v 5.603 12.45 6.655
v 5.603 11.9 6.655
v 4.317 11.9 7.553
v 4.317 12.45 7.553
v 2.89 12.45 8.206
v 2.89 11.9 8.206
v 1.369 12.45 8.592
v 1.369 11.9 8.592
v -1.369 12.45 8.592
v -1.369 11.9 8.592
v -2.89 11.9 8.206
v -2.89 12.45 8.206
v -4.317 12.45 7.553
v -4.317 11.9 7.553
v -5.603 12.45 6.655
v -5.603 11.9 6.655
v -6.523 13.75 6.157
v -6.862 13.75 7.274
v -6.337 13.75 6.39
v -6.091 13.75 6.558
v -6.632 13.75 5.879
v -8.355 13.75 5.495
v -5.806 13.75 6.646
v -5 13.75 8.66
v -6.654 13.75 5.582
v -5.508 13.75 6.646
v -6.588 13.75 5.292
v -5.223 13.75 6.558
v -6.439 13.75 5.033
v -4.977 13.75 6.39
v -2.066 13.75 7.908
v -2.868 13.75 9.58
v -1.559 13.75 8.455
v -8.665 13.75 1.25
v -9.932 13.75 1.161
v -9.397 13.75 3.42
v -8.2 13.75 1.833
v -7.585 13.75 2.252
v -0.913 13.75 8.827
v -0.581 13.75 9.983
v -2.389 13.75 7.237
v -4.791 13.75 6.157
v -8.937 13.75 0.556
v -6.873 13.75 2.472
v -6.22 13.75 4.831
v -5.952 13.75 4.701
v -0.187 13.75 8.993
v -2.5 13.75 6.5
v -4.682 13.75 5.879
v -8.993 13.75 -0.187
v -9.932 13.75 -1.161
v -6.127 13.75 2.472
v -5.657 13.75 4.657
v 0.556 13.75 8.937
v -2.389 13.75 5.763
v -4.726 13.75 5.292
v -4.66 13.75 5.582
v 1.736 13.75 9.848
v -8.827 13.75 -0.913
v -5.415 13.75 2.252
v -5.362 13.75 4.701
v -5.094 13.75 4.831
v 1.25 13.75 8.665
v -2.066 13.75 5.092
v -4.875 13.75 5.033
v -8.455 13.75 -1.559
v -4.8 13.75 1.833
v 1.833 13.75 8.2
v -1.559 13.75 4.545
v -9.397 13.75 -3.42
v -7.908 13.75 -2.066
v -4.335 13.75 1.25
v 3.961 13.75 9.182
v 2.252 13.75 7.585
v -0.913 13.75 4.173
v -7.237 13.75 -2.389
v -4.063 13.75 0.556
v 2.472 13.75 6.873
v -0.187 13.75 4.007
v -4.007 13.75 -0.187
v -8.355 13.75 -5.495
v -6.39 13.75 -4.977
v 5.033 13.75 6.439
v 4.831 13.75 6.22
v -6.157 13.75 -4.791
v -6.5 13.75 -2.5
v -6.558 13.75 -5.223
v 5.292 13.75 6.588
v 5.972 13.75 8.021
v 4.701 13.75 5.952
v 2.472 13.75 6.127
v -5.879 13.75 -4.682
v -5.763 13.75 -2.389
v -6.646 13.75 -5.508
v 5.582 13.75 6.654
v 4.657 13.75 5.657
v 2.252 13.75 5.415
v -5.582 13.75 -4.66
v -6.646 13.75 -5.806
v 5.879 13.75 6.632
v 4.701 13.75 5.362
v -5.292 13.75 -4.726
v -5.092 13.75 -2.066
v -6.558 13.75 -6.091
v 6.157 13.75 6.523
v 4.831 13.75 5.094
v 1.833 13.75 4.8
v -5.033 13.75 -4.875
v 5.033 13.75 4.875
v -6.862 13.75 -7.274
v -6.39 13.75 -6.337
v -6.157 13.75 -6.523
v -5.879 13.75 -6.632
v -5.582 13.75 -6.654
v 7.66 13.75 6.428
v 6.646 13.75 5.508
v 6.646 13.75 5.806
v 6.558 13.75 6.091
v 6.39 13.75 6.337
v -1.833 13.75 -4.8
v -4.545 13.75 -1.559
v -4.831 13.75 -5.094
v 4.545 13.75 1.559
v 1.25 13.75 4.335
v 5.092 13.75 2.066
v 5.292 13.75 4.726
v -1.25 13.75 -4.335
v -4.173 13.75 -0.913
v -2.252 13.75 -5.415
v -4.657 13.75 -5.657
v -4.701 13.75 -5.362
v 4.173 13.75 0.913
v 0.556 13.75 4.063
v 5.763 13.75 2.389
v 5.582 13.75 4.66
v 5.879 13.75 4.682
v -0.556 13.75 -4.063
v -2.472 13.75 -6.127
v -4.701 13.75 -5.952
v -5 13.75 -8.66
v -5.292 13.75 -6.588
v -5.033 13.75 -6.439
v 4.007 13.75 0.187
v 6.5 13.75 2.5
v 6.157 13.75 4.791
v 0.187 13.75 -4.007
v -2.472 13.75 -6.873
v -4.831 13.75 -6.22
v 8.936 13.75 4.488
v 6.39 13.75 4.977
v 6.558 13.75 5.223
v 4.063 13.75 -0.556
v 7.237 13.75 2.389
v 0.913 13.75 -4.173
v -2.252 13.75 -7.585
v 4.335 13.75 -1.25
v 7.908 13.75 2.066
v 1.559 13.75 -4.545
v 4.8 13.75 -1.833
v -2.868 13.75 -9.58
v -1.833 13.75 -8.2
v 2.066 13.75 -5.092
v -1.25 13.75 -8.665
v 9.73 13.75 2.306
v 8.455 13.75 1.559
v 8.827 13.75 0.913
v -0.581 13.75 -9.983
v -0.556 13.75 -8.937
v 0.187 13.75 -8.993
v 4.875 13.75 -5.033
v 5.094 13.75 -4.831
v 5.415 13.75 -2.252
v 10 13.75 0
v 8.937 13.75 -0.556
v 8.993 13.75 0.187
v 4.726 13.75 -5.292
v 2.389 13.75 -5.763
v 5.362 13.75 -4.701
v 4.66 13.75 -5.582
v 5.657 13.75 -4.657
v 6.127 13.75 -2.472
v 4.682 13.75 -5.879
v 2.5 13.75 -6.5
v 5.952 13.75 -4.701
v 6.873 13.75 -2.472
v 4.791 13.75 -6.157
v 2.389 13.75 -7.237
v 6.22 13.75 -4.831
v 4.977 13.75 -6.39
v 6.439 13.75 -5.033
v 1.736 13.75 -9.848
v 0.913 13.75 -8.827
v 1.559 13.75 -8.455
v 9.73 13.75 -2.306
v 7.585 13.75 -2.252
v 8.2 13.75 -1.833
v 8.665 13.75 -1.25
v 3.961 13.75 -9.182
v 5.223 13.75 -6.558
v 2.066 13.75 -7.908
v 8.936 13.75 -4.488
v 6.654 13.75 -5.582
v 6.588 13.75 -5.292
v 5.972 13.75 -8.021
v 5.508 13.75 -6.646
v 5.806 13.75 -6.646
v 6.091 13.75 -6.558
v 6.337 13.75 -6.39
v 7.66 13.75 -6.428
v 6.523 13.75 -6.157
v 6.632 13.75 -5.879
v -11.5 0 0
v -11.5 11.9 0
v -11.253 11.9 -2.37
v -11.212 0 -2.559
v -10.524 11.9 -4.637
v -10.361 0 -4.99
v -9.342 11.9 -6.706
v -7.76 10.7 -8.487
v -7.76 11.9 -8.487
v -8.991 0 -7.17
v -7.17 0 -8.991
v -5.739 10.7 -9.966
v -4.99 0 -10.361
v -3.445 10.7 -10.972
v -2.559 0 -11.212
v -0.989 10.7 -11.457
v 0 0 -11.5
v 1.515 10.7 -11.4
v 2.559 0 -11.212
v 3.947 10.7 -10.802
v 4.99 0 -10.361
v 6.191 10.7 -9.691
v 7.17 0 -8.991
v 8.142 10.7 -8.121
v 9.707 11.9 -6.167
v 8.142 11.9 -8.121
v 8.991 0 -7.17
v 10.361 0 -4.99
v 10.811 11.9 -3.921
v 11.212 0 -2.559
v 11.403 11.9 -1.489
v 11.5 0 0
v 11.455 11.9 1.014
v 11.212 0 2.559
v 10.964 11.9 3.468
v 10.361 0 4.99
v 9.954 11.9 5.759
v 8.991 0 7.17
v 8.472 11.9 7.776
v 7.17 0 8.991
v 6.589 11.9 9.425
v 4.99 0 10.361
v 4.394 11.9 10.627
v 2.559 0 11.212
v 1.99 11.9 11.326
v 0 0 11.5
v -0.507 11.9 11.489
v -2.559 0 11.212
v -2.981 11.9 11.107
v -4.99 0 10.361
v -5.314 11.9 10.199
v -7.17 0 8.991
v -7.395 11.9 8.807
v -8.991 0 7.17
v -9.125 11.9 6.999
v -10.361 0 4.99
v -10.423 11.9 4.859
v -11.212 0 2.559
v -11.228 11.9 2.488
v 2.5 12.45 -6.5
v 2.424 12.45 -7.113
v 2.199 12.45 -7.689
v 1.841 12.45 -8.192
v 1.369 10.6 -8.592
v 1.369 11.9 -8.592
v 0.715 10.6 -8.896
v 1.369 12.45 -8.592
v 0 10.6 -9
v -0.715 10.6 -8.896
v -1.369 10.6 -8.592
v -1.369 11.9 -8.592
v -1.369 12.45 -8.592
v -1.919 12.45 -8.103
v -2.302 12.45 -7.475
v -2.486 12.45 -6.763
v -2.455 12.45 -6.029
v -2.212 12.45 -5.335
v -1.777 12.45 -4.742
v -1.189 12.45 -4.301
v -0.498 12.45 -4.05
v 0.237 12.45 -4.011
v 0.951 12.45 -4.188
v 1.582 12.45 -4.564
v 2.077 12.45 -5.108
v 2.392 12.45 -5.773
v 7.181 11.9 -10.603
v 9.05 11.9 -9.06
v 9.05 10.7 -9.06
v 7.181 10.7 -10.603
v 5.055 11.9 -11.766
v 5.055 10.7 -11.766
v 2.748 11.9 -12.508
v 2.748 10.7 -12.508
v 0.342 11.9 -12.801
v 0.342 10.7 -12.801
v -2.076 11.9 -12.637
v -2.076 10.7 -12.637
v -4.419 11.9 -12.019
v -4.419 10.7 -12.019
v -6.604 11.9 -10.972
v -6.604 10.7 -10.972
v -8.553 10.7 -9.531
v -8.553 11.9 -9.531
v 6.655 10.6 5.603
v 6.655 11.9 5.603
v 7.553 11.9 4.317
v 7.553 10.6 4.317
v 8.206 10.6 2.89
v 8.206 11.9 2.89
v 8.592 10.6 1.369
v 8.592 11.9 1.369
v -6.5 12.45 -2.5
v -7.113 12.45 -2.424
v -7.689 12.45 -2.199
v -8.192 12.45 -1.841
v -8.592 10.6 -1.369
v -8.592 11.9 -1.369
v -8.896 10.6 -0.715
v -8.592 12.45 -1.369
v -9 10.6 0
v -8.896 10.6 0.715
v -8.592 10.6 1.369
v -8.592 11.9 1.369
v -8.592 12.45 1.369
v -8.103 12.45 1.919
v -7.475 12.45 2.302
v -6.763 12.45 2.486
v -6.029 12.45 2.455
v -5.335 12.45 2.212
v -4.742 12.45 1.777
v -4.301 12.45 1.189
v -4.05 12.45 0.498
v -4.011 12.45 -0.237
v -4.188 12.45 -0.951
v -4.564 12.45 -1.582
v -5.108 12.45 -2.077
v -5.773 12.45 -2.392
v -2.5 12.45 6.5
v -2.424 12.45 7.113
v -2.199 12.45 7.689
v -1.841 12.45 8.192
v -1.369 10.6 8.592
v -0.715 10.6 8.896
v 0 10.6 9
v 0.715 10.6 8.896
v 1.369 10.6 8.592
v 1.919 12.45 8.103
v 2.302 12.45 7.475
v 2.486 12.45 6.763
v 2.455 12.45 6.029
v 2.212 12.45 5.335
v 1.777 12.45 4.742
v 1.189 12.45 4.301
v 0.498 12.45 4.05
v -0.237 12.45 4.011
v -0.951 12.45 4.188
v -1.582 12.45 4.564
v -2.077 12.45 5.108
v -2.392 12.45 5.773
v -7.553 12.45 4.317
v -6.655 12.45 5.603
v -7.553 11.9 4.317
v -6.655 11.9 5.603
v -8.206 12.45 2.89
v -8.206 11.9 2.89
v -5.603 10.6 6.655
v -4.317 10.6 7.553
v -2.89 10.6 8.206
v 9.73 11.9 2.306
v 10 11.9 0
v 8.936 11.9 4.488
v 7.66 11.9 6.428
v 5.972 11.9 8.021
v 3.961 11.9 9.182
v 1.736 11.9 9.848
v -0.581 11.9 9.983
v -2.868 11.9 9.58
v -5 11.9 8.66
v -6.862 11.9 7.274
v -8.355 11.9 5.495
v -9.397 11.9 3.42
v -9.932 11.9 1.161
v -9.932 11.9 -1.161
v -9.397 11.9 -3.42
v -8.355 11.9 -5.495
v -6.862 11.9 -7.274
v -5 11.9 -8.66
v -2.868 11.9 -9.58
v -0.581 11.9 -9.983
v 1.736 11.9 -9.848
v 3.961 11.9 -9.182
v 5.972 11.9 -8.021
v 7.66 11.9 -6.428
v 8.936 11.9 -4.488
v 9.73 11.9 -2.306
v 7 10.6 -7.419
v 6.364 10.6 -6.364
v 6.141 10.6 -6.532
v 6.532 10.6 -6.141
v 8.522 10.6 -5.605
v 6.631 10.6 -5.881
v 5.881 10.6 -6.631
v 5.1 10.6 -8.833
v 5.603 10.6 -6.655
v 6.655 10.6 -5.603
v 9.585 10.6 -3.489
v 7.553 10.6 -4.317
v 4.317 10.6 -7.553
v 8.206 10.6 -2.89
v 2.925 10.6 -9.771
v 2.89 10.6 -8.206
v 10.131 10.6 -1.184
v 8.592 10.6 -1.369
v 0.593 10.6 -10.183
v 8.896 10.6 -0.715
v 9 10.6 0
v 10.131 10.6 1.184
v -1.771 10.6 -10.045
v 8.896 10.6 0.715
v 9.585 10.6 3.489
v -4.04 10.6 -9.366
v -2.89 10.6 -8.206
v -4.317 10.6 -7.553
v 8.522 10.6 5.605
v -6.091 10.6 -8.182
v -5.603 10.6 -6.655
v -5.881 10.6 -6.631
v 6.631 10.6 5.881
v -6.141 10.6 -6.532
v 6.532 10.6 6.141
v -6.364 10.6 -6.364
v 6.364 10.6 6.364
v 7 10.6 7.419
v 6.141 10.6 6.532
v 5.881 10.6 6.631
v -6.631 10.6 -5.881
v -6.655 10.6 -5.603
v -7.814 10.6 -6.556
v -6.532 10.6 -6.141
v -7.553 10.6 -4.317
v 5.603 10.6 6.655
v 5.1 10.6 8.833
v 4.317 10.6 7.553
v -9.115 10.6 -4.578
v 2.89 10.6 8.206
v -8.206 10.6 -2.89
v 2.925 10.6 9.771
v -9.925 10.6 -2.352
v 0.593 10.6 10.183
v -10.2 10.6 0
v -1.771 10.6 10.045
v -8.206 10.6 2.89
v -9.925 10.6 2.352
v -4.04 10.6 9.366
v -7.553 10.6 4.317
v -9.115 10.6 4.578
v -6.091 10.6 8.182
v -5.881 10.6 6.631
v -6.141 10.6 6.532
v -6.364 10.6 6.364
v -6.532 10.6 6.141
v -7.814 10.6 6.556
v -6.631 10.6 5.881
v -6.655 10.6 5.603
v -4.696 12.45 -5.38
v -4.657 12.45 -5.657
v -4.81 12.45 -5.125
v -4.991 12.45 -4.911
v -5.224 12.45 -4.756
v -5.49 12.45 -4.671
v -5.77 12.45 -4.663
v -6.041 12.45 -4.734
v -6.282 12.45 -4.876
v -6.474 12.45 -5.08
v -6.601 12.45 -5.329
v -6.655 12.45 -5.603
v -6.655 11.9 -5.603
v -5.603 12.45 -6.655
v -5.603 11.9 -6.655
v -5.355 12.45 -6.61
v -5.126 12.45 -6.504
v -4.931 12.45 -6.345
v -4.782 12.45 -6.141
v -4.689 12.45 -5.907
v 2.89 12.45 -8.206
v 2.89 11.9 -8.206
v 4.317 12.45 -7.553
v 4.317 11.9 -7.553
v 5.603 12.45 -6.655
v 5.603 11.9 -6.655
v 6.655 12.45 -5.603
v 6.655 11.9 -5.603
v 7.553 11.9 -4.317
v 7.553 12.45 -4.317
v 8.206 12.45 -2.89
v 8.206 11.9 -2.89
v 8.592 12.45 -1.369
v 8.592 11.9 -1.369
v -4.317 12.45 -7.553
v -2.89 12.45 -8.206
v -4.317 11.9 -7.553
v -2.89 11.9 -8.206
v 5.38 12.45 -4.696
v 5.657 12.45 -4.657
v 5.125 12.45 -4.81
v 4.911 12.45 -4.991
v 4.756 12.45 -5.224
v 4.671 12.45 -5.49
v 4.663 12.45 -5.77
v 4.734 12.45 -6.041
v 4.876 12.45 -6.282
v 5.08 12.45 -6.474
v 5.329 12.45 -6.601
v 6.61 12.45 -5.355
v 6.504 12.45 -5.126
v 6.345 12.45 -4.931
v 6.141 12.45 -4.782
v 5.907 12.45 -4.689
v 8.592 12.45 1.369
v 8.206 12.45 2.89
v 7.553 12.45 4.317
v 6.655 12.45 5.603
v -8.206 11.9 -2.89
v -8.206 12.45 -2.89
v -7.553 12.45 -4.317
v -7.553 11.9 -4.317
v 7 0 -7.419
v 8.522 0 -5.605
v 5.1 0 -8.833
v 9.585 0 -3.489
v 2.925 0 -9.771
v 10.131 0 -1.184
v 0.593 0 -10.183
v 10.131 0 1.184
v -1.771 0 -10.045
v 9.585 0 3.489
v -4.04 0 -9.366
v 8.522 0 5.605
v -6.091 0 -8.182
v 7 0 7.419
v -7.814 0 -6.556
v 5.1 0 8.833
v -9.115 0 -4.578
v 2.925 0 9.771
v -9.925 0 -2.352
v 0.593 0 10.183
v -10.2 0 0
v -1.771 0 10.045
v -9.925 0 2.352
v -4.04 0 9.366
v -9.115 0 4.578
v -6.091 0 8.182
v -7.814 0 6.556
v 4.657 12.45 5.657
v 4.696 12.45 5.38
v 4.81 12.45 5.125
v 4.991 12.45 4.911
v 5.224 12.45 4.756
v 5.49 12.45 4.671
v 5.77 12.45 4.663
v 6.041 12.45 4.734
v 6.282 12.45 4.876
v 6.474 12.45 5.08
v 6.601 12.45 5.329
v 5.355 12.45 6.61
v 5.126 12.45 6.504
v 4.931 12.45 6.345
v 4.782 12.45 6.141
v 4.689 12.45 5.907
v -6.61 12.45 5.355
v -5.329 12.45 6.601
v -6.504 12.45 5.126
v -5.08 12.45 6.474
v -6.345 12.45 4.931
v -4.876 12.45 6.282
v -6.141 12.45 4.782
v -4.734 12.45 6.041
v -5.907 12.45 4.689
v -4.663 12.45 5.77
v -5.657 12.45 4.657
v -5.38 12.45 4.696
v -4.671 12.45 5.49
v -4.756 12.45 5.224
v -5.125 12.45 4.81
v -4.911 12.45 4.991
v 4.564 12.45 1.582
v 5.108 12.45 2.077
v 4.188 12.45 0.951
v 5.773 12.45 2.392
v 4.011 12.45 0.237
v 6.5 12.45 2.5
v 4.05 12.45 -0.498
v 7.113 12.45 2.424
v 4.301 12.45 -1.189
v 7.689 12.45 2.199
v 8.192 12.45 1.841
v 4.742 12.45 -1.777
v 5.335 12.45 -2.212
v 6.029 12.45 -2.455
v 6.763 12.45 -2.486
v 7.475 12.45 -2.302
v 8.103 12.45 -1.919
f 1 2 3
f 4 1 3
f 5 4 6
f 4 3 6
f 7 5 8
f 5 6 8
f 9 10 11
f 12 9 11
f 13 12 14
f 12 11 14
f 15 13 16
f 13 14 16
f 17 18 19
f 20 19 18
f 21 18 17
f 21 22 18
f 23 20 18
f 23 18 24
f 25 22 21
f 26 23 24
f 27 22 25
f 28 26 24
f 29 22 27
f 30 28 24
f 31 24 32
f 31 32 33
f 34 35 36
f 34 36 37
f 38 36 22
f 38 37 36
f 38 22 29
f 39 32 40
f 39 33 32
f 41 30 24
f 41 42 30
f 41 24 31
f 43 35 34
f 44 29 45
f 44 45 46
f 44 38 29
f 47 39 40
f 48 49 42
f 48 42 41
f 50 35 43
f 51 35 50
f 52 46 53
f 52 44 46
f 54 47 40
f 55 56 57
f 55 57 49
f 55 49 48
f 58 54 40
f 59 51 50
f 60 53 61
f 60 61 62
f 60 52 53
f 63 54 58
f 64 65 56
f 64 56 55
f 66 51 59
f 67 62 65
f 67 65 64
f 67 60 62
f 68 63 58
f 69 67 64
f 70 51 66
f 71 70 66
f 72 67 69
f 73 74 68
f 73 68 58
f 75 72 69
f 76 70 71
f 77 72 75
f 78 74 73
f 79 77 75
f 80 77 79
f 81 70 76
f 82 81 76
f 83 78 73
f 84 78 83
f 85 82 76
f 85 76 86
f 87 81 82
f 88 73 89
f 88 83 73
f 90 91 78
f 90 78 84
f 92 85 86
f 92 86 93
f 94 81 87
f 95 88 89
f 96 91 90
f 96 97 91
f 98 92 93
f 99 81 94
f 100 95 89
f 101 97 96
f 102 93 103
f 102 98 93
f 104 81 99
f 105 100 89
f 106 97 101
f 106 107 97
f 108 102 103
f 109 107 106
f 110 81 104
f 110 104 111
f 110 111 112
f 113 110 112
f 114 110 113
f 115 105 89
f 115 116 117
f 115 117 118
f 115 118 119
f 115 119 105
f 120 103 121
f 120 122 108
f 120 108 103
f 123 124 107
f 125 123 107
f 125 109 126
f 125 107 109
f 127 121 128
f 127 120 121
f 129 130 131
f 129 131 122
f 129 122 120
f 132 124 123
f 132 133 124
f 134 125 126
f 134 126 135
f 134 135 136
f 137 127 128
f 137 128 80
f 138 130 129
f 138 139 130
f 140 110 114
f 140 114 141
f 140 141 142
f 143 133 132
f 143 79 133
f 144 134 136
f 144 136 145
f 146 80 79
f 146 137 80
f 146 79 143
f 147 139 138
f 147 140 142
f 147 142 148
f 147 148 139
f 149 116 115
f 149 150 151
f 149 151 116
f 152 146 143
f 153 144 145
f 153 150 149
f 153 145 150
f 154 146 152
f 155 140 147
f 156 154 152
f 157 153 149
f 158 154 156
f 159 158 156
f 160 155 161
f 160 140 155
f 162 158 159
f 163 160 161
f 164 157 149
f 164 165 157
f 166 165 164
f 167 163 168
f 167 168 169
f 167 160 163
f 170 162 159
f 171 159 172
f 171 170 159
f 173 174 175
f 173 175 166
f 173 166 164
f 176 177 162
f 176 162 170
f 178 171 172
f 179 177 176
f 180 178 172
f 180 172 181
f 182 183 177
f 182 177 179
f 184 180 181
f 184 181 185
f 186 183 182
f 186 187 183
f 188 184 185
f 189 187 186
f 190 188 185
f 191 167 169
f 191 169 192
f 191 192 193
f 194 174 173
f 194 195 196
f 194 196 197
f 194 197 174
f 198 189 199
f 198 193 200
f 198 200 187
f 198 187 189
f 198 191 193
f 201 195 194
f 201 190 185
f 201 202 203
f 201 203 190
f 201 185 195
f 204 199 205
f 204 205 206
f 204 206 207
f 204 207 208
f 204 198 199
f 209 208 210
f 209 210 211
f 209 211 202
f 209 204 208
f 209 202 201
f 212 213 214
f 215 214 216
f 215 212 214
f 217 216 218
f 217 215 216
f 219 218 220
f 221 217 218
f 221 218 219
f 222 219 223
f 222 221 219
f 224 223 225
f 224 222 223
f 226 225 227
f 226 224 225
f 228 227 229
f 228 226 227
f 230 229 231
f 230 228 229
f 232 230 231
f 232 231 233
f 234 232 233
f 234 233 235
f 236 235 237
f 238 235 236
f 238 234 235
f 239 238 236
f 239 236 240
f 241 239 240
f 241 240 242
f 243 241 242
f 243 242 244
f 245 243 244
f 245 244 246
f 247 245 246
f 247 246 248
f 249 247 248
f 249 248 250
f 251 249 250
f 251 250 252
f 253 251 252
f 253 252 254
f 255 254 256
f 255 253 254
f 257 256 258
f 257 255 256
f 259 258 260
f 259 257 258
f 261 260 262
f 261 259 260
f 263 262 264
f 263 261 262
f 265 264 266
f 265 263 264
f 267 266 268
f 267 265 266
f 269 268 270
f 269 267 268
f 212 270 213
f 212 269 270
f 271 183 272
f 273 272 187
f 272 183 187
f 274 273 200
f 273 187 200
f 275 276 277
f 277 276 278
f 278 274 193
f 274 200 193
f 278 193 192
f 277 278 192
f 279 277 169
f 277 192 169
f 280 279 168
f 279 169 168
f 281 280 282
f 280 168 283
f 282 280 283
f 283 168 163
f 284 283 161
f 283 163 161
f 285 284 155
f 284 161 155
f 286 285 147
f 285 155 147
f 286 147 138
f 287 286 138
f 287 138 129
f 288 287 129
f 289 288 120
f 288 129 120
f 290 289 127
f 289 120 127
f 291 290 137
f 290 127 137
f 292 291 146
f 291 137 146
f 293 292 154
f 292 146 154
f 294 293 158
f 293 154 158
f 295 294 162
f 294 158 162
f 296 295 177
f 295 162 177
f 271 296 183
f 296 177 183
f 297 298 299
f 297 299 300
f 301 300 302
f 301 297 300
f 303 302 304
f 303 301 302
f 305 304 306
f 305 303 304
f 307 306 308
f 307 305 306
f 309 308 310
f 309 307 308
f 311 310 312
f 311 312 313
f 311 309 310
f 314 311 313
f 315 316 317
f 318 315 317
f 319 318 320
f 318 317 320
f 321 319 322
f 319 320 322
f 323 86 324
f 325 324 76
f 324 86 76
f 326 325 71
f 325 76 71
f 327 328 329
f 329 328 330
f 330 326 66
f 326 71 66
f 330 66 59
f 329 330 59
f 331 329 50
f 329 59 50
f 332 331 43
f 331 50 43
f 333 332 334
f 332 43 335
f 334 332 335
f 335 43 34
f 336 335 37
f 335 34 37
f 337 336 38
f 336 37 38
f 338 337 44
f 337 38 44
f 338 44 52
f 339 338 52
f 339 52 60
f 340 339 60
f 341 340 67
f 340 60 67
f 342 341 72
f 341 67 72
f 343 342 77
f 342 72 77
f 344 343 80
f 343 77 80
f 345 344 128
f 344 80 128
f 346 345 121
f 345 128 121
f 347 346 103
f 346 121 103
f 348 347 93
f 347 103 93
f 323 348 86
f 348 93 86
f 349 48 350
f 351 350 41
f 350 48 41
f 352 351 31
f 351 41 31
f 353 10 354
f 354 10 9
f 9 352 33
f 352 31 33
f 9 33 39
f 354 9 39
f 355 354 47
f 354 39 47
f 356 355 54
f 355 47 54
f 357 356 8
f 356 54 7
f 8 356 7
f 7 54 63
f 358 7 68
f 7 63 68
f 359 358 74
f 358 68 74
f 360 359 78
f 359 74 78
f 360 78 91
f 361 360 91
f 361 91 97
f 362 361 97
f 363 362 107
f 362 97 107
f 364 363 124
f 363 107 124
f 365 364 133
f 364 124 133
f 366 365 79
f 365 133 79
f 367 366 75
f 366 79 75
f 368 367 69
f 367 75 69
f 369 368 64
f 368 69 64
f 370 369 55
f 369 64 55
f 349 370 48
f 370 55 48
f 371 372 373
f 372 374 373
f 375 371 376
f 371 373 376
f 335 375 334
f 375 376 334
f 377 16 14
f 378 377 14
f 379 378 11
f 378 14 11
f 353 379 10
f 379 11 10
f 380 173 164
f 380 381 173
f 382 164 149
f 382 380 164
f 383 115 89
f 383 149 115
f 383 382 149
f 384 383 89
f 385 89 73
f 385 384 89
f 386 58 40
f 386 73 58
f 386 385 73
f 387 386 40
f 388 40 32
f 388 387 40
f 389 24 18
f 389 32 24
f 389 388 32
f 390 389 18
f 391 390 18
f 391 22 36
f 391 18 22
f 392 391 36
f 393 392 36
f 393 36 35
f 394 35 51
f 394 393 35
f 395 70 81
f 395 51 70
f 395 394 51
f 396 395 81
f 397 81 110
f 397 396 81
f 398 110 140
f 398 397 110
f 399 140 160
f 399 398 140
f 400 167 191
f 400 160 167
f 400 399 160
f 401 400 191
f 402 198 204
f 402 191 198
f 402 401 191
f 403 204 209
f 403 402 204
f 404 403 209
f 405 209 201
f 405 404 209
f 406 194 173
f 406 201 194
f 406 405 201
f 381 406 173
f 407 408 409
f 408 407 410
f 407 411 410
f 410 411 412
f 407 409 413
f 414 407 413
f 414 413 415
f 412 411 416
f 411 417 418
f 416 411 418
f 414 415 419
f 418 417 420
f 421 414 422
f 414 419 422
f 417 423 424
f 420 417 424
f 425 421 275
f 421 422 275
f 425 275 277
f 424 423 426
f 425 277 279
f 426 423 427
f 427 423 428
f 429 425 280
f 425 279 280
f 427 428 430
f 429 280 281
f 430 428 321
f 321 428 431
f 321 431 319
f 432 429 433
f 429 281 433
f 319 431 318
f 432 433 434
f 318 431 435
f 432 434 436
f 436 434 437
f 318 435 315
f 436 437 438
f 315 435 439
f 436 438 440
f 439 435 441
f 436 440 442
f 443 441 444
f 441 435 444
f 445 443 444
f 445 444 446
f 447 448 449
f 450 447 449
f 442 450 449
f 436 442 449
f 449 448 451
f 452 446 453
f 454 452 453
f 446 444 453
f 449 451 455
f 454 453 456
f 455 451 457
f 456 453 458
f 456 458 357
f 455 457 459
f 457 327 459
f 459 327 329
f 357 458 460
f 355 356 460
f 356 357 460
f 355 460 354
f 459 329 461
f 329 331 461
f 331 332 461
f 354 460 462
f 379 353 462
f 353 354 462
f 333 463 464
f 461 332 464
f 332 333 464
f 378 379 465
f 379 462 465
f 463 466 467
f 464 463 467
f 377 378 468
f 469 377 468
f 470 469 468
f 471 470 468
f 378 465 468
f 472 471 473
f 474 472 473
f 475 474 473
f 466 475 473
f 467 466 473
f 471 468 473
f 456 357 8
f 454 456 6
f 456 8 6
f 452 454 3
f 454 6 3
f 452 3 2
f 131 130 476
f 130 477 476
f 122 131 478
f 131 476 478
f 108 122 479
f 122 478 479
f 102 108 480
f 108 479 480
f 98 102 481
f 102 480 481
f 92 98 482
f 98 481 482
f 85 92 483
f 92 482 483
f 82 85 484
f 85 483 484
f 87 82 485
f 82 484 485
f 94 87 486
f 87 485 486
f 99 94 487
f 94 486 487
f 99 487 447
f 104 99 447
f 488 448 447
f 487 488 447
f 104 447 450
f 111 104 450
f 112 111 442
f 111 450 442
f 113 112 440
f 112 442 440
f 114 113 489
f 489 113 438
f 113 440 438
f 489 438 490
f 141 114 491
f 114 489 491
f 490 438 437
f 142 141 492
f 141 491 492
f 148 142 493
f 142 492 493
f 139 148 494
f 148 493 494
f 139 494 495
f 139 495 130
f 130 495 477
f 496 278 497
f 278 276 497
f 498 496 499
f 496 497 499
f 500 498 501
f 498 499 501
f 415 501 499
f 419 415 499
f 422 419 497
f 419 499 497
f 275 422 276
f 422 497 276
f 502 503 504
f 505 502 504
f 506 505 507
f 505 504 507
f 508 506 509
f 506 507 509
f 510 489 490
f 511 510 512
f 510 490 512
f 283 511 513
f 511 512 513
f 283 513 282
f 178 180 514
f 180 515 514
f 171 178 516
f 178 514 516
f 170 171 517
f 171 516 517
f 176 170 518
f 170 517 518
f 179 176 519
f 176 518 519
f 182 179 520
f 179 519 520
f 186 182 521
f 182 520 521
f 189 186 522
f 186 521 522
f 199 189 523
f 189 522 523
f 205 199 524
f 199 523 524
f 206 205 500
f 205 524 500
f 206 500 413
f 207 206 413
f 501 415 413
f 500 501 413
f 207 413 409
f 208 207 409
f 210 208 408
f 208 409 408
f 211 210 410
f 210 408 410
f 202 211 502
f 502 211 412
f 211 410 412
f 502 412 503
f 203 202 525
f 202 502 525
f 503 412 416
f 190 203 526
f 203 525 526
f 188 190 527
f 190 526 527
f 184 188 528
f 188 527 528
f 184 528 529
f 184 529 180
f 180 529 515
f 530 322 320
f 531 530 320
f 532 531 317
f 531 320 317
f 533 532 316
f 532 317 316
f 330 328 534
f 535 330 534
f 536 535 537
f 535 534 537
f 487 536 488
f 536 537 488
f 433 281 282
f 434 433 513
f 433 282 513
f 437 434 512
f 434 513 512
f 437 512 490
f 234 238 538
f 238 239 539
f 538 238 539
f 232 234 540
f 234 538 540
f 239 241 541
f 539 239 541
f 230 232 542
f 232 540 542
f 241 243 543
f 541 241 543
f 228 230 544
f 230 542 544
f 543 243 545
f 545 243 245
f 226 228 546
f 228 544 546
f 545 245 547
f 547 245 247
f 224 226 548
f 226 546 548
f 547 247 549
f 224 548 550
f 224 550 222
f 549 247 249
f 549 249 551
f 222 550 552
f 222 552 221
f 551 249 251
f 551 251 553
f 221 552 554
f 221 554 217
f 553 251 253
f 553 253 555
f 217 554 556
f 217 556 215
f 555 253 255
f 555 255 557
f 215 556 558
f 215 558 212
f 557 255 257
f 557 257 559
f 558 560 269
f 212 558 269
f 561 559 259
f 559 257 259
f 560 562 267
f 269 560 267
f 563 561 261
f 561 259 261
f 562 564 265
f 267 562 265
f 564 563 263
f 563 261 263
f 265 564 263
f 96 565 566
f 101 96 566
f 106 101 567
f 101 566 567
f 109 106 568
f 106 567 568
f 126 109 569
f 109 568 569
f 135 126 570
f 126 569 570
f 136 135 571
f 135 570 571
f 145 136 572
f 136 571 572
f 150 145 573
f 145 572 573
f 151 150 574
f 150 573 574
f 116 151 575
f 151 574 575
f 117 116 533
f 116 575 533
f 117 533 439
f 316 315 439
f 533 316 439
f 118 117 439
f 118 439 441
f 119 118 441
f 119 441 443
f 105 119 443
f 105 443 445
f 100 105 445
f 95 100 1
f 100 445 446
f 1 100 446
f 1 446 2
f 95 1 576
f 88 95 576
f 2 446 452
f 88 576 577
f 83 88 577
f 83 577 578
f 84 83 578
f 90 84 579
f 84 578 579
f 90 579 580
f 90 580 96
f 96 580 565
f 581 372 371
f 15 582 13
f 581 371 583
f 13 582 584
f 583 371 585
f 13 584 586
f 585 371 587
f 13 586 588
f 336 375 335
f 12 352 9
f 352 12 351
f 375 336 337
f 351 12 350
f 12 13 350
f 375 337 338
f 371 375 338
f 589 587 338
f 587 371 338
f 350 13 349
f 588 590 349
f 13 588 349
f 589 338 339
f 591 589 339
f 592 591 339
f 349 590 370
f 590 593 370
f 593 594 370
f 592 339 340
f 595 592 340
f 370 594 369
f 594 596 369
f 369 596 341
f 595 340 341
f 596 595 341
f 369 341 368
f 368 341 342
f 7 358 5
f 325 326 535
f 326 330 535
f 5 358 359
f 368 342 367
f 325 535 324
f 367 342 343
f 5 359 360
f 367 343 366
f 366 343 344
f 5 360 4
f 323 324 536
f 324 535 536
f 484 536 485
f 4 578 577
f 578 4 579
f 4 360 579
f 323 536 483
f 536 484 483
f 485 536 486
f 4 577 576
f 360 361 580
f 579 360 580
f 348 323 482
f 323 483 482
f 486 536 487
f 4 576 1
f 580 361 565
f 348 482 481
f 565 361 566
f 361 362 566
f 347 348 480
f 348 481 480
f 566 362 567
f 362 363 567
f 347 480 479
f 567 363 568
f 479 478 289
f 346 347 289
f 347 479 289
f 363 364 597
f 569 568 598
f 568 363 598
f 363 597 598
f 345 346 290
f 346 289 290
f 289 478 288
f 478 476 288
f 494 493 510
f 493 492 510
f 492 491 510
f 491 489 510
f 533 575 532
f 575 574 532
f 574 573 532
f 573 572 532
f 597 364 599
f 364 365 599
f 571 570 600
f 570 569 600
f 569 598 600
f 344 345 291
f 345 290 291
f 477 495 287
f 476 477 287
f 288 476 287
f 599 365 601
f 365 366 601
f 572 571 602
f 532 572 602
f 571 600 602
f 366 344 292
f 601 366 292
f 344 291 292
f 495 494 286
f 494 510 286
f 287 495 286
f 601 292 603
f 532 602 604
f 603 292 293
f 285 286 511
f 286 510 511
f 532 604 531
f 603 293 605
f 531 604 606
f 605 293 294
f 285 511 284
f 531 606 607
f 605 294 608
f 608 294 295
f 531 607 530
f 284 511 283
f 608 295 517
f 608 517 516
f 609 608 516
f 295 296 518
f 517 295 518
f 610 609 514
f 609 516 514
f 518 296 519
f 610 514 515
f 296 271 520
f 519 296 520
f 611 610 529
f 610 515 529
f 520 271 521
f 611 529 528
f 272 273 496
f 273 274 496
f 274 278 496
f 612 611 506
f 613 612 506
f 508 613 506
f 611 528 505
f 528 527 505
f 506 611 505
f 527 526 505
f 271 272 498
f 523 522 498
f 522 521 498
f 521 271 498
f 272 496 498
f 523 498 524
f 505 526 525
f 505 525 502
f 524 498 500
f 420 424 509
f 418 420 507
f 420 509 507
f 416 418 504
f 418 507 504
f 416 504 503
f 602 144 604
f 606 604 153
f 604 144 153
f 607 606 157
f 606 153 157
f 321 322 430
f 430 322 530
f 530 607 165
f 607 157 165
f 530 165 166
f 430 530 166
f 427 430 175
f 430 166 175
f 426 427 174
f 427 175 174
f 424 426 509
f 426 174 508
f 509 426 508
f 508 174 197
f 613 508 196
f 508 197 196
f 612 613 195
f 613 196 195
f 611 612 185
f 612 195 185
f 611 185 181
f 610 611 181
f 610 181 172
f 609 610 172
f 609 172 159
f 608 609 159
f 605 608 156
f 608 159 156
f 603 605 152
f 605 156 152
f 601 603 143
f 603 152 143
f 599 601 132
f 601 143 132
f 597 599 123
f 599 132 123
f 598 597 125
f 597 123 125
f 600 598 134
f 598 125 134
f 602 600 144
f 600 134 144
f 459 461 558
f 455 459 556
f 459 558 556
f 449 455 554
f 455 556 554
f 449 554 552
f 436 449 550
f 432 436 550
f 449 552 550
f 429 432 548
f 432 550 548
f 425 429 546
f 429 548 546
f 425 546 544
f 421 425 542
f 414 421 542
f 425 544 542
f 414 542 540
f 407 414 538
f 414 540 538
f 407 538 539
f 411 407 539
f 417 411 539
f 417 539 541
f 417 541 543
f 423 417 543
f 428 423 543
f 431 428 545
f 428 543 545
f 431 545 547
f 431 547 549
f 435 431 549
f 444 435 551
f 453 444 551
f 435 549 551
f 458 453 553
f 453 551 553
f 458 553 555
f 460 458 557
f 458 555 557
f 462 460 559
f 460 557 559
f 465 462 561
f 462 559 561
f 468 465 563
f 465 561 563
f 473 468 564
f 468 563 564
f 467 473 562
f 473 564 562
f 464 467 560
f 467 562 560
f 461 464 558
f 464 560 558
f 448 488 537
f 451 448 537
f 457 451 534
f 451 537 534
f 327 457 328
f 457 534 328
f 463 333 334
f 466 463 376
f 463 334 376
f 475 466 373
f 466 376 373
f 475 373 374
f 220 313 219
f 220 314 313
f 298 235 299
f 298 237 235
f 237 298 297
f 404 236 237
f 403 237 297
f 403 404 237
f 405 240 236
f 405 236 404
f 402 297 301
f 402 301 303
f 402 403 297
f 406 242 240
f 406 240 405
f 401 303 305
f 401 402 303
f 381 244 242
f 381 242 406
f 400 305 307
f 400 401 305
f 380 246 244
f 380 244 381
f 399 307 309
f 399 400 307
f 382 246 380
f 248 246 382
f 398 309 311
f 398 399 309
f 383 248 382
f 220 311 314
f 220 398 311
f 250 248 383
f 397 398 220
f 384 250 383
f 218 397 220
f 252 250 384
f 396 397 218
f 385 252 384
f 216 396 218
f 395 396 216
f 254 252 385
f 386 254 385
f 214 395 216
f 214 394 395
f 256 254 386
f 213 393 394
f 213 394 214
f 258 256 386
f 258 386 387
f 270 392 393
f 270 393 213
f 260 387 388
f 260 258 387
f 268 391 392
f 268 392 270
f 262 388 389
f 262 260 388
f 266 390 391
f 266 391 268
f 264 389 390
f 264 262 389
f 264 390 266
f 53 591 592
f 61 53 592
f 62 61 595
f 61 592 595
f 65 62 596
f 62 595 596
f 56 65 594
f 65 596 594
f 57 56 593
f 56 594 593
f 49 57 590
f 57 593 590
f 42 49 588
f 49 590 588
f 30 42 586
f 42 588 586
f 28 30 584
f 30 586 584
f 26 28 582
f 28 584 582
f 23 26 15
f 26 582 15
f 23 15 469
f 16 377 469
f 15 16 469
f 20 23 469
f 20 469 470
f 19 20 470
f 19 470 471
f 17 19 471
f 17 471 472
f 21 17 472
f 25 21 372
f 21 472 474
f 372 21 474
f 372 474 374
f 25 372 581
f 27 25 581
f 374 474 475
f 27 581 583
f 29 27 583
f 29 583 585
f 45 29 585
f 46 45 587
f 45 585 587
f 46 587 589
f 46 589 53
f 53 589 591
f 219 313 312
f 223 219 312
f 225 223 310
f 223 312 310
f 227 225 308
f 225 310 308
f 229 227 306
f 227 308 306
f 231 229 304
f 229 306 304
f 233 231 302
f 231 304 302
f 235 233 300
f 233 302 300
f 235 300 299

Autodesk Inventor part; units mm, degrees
ref_plane "XZ Plane" through (0, 0, 0) normal (0, 1, 0) x (-1, 0, 0)
sketch "Sketch1" plane through (0, 0, 0) normal (0, 1, 0) x (-1, 0, 0)
  circle A0 centre (0, 0) radius 11.5
  dimension "d0" = 23
extrude "Extrusion1" add sketch "Sketch1" along normal blind 11.9
sketch "Sketch2" plane through (0, 11.9, 0) normal (0, 1, 0) x (1, 0, 0)
  circle A0 centre (0, 0) radius 10
  dimension "d3" = 20
extrude "Extrusion2" add sketch "Sketch2" along normal blind 1.85
sketch "Sketch3" plane through (0, 13.75, 0) normal (0, 1, 0) x (1, 0, 0)
  circle A0 centre (0, 0) radius 10 projected
  circle A1 centre (0, 6.5) radius 2.5
  dimension "d6" = 5
  dimension "d23" = 6.5
extrude "Extrusion3" cut sketch "Sketch3" against normal blind 5 contours A1
ref_plane "Work Plane1" through (0, 0, 0) normal (0.7071068, 0, 0.7071068) x (0, 1, 0)
sketch "Sketch4" plane through (0, 13.75, 0) normal (0, 1, 0) x (1, 0, 0)
  line L0 (16.1, 16.1) -> (-16.1, -16.1) projected
  point P0 (0, 0)
  point P1 (5.6569, 5.6569)
  dimension "d10" = 8
hole "Hole1" at (5.6569, 13.75, -5.6569) direction (0, -1, 0) diameter 2 depth 4.5 tip angle 118
pattern_circular "Circular Pattern1" count 4 over 360 about axis through (0, -10, 0) along (0, 1, 0) of "Extrusion3", "Hole1"
shell "Shell1" thickness 1.3 removed faces 17 at (-0.1507, 0, 2.542) at (-0.852, 8.75, -7.0526) at (6.099, 10.4167, 2.4676) at (7.0526, 8.75, -0.852) at (2.4676, 10.4167, -6.099) at (5.7373, 12.25, -4.6601) at (5.843, 9.1165, -4.9017) at (6.3455, 9.1165, 6.0183) at (4.6601, 12.25, 5.7373) at (0.852, 8.75, 7.0526) at (-2.4676, 10.4167, 6.099) at (-7.0526, 8.75, 0.852) at (-6.099, 10.4167, -2.4676) at (-5.843, 9.1165, 4.9017) at (-5.7373, 12.25, 4.6601) at (-4.9017, 9.1165, -5.843) at (-4.6601, 12.25, -5.7373)
sketch "Sketch5" plane through (0, 11.9, 0) normal (0, 1, 0) x (1, 0, 0)
  arc A0 (9.0498, 9.0605) -> (-8.5529, 9.531) centre (0, 0) ccw
  arc A1 (8.1423, 8.1211) -> (-7.76, 8.4872) centre (0, 0) ccw
  line L0 (-8.5529, 9.531) -> (-7.76, 8.4872)
  line L1 (8.1423, 8.1211) -> (9.0498, 9.0605)
extrude "Extrusion4" add sketch "Sketch5" against normal blind 1.2
properties part number "motor_GM1806-80T_SkyproRO_stator" material "Iron, Cast"
